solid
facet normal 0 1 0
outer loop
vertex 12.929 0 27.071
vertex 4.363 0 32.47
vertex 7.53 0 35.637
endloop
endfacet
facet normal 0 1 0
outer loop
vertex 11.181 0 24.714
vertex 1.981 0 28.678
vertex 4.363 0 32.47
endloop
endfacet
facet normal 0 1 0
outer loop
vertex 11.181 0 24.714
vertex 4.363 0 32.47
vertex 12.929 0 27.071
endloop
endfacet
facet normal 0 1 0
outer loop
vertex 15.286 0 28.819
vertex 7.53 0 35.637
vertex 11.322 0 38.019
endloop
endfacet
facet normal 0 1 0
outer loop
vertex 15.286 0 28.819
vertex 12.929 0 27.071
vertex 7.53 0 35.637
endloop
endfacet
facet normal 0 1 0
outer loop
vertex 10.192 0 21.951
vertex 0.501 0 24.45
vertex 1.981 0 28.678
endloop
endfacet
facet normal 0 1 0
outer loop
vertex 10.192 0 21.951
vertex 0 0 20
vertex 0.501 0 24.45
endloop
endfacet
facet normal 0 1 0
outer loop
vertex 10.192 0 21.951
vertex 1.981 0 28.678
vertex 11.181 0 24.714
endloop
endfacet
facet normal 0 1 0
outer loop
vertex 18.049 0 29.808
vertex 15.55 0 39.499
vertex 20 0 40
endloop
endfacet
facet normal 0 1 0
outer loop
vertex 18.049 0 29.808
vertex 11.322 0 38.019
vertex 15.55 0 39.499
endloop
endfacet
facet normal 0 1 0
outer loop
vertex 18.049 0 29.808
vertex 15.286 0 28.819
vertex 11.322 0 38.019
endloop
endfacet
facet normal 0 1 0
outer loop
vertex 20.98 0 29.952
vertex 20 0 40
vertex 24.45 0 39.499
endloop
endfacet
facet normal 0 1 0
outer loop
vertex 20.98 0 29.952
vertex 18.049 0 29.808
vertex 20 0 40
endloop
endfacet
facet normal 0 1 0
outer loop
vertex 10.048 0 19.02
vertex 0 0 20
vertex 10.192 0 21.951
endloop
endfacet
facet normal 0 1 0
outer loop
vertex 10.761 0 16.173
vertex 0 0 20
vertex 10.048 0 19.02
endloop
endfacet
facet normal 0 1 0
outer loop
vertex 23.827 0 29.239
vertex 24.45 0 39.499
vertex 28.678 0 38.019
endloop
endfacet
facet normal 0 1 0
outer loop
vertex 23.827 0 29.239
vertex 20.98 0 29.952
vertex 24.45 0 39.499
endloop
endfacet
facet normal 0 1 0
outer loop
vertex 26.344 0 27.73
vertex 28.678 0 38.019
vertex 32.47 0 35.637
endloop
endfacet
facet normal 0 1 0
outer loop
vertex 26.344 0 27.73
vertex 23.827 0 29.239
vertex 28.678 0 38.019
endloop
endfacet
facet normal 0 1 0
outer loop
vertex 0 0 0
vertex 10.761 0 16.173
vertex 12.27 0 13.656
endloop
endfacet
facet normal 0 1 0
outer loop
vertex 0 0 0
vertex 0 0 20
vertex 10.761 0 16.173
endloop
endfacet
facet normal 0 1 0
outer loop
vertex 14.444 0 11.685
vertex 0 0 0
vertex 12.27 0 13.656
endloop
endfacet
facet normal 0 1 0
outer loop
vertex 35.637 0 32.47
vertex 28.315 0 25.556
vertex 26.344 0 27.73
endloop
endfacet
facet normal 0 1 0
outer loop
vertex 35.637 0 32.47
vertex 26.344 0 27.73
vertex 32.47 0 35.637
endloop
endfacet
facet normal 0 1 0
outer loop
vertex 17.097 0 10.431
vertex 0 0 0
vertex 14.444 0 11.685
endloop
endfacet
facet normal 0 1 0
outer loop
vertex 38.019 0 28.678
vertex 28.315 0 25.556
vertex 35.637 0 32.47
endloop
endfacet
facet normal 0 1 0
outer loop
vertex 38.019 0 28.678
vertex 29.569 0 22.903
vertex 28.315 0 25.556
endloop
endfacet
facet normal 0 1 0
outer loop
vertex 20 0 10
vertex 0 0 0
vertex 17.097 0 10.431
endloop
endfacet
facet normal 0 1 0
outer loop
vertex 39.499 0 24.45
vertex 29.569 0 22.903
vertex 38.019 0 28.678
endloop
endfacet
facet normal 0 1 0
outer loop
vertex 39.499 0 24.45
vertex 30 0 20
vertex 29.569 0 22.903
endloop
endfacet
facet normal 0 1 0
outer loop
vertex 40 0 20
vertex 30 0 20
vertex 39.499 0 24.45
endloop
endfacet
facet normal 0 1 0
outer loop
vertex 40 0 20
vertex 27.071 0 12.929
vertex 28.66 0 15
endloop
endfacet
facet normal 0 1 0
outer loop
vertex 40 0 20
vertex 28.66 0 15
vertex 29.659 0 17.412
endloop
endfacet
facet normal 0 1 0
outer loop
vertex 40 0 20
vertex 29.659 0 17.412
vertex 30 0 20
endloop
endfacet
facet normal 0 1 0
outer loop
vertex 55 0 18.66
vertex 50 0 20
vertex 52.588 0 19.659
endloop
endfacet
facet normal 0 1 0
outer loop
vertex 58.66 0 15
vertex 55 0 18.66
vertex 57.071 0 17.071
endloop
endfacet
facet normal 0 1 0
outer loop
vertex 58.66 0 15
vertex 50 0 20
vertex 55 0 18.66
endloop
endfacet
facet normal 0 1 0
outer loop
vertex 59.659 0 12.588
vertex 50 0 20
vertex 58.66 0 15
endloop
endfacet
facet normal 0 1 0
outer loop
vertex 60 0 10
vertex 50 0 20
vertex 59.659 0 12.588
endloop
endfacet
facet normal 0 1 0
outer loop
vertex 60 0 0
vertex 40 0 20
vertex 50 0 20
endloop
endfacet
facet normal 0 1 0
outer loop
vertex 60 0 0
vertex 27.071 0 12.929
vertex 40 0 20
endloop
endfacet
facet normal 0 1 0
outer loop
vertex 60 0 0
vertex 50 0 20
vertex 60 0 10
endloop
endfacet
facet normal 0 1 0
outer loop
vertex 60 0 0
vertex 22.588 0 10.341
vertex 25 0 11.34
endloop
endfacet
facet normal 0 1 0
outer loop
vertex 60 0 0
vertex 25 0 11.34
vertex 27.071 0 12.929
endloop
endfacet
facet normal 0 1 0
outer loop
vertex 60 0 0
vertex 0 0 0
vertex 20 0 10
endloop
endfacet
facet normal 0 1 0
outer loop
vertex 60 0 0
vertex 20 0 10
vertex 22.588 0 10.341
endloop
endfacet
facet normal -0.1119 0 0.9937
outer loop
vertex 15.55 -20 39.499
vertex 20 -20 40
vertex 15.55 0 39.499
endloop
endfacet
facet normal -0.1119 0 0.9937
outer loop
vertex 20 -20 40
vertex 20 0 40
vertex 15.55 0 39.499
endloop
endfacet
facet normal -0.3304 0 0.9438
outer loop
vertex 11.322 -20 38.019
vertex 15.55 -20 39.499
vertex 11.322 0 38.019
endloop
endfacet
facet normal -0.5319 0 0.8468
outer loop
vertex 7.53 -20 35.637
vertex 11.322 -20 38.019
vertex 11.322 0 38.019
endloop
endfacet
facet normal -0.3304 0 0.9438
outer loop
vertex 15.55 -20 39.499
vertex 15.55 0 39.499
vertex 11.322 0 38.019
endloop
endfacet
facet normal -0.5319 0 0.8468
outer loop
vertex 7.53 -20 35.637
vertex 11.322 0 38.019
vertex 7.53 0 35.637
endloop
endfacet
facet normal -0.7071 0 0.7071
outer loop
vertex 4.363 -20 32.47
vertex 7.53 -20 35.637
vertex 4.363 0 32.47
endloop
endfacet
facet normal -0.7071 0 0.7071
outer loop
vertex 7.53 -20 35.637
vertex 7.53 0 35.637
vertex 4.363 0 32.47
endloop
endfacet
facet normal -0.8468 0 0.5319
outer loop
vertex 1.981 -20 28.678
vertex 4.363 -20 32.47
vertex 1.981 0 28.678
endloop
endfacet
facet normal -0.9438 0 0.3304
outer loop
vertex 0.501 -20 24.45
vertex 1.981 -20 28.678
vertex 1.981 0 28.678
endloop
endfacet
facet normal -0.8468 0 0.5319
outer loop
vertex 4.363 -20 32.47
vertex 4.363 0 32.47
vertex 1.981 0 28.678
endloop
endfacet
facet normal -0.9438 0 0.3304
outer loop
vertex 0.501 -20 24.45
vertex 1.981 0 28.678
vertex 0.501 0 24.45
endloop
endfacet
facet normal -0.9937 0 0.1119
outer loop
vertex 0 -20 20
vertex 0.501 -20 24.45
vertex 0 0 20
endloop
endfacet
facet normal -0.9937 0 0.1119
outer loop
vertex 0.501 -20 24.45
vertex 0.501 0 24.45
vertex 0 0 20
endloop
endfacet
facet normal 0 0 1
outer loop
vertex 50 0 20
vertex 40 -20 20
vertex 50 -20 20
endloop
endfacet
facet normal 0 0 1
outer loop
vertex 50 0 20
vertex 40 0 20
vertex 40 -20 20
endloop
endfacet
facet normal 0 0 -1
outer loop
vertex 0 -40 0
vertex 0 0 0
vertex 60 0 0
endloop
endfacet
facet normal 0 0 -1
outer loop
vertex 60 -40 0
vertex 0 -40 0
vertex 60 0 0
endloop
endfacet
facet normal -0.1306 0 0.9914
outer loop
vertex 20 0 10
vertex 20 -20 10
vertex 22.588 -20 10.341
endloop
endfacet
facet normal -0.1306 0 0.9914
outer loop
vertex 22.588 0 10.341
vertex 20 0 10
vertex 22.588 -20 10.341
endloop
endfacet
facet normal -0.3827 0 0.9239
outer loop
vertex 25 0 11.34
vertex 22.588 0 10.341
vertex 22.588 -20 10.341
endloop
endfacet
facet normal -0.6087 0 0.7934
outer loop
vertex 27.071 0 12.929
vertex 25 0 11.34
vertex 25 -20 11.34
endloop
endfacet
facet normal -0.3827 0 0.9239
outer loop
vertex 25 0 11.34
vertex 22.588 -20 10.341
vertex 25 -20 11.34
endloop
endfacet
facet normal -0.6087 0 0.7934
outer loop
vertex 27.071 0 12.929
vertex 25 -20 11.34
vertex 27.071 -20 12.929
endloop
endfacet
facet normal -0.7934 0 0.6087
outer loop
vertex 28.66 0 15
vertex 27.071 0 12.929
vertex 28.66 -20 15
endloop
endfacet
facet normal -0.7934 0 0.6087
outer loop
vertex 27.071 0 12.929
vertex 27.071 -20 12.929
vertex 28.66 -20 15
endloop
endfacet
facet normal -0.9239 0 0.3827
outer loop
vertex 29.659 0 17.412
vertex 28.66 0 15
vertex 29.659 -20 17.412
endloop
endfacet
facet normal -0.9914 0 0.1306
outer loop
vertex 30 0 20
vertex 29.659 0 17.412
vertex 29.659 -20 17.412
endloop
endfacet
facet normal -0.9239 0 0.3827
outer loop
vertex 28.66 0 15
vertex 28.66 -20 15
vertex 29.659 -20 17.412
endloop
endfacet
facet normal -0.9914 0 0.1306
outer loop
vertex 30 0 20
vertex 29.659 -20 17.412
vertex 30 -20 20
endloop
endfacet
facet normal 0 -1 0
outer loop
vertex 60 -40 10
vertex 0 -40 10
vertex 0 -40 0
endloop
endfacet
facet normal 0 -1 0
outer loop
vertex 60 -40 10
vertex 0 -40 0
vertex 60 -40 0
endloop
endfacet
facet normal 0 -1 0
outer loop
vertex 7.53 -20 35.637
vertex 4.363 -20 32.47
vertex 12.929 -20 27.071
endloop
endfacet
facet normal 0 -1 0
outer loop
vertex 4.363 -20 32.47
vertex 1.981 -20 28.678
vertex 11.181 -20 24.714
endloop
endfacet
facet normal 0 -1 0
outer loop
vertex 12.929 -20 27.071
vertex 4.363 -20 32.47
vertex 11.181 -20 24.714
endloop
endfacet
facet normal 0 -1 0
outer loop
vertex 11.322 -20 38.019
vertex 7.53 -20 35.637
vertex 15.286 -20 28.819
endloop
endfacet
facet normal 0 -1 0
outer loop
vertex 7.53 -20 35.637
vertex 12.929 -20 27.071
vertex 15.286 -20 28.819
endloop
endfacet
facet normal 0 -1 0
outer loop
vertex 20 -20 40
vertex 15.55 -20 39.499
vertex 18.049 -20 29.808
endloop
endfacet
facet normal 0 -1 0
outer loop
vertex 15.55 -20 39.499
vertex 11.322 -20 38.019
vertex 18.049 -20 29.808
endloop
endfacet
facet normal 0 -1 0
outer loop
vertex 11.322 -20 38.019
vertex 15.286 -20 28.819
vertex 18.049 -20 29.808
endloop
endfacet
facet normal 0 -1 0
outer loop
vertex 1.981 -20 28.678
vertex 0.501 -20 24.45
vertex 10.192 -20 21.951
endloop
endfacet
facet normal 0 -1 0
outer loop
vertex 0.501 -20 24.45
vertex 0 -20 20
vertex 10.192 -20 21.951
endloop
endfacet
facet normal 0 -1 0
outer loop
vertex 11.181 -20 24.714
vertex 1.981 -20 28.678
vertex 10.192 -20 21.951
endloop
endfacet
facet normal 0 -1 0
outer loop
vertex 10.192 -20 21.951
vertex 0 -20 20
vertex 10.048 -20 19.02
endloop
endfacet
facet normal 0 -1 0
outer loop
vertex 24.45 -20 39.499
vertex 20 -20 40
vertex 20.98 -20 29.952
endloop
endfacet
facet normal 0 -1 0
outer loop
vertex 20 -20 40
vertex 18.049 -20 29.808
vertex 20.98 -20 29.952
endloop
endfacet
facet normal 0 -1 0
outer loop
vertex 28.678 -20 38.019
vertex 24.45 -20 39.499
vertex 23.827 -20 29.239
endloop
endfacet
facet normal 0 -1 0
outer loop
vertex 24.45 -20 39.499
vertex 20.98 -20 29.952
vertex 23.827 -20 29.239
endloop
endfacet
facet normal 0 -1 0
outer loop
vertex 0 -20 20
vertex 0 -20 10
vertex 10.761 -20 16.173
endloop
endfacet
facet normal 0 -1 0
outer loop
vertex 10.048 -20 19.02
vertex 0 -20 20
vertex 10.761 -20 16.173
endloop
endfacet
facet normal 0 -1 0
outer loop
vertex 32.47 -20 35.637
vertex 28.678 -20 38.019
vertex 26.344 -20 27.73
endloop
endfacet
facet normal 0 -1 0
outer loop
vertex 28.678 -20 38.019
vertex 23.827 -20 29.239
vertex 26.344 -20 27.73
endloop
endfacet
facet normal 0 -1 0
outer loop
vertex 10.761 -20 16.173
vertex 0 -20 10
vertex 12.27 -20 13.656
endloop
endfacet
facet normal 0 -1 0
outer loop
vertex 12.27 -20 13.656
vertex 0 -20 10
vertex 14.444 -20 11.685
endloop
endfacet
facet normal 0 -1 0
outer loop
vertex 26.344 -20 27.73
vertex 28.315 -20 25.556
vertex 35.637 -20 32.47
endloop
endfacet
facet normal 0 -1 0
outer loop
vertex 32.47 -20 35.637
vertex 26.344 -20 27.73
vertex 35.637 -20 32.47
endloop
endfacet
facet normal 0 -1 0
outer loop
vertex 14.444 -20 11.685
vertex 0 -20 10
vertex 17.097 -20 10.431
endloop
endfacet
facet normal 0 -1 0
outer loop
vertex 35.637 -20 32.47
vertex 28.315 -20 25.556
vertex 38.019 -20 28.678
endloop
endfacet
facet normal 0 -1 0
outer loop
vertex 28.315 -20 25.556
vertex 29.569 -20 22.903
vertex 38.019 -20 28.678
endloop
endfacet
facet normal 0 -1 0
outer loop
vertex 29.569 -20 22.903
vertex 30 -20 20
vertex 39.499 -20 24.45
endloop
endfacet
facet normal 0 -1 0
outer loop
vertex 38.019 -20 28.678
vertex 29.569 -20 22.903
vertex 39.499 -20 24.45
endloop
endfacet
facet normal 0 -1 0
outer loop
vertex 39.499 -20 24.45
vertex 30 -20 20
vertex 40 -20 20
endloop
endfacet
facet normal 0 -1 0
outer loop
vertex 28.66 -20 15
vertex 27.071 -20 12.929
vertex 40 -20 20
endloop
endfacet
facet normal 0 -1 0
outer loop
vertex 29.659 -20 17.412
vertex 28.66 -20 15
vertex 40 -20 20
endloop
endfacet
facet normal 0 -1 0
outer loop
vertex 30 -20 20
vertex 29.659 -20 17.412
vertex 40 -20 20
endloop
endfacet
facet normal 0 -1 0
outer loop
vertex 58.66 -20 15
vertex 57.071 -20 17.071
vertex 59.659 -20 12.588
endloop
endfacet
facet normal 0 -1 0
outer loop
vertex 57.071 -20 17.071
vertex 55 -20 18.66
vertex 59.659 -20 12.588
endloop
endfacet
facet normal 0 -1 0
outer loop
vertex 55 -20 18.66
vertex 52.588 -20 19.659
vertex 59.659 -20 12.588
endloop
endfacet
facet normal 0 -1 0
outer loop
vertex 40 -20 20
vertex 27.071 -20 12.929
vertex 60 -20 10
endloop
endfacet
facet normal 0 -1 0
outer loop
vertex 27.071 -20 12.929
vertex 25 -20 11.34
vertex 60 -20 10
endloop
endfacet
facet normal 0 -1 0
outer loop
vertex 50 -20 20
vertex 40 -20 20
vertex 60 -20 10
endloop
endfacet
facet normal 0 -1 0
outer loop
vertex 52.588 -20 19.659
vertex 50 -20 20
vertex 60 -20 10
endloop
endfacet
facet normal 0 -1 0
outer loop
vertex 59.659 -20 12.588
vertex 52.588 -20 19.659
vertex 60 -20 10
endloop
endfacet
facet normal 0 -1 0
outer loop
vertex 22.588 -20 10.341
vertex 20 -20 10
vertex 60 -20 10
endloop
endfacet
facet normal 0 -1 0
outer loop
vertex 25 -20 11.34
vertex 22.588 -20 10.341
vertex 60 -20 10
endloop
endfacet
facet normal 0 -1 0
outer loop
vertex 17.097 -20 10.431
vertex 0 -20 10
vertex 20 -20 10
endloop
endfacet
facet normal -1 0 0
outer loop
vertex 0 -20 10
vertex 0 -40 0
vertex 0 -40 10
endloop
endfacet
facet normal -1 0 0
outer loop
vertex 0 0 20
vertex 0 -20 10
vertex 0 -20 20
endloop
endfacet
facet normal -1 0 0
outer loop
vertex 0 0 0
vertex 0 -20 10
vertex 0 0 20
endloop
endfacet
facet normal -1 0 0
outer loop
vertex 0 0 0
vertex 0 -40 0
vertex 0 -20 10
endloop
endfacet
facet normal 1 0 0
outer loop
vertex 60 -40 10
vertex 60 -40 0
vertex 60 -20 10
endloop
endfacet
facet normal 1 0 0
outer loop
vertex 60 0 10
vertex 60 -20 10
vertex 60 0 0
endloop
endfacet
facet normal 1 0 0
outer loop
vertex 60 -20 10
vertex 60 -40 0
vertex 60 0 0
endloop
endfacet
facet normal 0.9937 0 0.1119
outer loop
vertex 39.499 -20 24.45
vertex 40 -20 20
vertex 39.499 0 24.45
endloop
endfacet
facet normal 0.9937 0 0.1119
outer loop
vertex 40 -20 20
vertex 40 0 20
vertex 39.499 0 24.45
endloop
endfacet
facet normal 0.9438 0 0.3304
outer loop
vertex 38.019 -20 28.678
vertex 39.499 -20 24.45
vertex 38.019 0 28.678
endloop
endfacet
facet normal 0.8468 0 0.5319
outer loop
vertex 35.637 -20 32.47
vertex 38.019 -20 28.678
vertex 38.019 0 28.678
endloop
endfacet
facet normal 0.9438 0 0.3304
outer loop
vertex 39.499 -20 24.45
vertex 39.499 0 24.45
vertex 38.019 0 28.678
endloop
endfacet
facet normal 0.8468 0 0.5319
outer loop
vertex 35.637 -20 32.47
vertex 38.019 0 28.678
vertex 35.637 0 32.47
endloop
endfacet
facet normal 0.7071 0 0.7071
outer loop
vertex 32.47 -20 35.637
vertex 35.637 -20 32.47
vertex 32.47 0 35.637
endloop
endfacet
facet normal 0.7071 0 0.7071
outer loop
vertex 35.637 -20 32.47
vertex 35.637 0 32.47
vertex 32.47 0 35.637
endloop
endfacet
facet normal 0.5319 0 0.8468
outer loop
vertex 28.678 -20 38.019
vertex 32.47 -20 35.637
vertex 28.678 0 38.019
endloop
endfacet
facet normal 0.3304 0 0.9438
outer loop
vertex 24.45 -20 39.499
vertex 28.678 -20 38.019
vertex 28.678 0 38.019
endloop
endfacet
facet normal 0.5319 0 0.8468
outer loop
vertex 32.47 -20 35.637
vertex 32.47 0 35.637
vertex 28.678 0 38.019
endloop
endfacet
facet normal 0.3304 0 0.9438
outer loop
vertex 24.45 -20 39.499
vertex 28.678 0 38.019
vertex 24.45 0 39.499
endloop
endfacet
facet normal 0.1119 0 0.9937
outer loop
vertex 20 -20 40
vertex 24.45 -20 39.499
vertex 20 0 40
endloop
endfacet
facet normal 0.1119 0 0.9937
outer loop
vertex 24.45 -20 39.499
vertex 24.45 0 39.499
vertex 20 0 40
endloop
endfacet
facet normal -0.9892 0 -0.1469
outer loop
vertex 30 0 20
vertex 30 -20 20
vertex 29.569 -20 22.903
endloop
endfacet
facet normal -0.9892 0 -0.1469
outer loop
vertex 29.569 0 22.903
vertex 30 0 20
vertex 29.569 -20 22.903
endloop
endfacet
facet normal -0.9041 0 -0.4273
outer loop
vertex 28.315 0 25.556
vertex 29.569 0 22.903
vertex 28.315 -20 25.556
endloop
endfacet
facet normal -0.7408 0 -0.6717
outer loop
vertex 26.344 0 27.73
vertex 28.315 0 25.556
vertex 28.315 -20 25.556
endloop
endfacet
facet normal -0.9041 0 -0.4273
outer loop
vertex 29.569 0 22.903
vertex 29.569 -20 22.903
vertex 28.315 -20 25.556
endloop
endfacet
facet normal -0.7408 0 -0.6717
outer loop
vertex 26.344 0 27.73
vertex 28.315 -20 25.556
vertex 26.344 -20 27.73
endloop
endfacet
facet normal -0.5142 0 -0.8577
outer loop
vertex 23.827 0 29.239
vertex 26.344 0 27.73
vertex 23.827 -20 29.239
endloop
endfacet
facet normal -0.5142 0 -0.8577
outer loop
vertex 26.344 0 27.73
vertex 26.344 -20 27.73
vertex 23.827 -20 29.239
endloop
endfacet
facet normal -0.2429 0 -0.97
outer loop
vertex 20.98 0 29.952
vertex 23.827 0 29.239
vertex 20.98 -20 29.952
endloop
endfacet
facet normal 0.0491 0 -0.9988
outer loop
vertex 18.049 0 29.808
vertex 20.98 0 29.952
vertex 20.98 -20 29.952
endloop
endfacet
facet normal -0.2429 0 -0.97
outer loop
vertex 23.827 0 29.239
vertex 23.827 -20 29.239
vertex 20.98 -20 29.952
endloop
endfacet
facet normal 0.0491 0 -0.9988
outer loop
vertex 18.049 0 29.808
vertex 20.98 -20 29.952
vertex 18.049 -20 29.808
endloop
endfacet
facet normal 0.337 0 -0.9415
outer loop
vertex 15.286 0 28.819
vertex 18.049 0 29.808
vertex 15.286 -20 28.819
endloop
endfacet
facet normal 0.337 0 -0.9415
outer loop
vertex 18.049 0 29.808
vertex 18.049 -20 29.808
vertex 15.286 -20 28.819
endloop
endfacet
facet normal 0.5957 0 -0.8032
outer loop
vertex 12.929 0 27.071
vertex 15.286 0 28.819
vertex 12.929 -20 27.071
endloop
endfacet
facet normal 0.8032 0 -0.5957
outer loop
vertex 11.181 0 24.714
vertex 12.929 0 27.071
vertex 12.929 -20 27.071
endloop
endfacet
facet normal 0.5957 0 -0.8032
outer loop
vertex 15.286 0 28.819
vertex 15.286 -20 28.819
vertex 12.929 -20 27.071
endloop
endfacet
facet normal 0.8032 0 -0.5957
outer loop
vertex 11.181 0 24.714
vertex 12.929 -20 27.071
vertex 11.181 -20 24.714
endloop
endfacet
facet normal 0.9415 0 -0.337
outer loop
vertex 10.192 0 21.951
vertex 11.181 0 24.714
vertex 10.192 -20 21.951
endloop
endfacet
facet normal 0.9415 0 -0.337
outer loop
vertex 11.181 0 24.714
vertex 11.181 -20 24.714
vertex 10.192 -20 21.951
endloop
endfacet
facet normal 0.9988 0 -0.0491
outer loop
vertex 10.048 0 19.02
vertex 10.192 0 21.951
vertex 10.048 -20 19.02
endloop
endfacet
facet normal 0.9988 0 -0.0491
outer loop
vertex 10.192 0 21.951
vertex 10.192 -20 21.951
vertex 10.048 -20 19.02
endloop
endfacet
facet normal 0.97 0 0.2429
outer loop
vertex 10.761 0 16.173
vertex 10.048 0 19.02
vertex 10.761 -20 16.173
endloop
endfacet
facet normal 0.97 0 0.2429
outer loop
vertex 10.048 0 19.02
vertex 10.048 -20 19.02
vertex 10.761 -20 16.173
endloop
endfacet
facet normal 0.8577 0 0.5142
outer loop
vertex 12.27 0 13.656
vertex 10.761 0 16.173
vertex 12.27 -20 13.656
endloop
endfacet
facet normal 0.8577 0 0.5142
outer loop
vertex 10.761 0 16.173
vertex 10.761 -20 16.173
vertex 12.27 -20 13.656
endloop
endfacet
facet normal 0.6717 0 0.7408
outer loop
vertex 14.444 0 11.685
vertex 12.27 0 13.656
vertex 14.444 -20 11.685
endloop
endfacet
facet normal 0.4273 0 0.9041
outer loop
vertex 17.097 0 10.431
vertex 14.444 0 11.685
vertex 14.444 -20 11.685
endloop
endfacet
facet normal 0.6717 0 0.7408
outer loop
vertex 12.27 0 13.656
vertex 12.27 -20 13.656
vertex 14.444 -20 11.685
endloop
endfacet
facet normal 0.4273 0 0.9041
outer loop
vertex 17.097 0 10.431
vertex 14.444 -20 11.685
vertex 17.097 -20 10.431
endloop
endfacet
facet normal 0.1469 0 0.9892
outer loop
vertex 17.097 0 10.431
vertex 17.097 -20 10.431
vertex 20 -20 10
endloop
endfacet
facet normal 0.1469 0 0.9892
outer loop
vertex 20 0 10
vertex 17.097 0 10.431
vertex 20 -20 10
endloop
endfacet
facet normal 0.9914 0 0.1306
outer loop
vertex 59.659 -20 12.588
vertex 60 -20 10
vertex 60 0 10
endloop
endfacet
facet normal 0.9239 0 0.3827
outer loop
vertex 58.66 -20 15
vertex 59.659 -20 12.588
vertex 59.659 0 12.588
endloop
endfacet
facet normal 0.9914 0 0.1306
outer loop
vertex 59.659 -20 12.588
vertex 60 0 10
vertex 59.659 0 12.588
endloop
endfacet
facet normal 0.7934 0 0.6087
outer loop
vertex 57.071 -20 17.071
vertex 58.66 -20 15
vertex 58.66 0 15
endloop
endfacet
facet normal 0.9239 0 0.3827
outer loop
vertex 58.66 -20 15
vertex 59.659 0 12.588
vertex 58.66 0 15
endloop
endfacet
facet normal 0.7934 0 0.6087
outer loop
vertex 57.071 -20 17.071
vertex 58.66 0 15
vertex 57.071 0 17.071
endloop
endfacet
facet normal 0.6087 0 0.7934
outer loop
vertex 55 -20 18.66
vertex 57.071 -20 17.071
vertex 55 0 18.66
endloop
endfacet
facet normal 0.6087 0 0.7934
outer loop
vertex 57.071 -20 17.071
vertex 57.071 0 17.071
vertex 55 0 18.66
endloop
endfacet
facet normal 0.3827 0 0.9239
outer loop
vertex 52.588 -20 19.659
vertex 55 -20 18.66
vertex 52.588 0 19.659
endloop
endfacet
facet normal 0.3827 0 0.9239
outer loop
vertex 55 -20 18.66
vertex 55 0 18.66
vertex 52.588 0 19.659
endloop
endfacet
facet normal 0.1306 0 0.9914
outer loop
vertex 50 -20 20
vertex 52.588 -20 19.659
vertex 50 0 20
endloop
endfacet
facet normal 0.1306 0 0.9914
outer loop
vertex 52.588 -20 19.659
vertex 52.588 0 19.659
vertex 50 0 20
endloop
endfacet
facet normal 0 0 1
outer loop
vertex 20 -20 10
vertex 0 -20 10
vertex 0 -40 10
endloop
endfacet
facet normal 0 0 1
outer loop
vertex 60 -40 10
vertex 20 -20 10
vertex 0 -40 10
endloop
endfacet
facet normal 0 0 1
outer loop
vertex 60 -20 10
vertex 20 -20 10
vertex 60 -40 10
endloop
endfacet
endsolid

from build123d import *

# Parameters (mm, degrees)
F0_W     = 60
F0_H     = 10
F1_DEPTH = 40
F2_W     = 20
F2_H     = 20
F3_DEPTH = 10
F4_W     = 40
F4_H     = 20
F5_DEPTH = 30
F6_R     = 10
F7_R     = 19.99999
F9_DEPTH = 25


# Not quite as in the source:
# - a fillet or chamfer is up to 0.001 mm smaller than in the source, because OpenCascade refuses the exact size


with BuildPart() as f1:
    # F0 (on Front) → F1 (new body)
    with BuildSketch(Plane.XZ):
        with Locations((30, 5)):
            Rectangle(F0_W, F0_H)
    extrude(amount=F1_DEPTH)

    # F2 (on face) → F3 (join)
    with BuildSketch(Plane.XY.offset(10)):
        with Locations((50, -10)):
            Rectangle(F2_W, F2_H)
    extrude(amount=F3_DEPTH)

    # F4 (on face) → F5 (join)
    with BuildSketch(Plane.XY.offset(10)):
        with Locations((20, -10)):
            Rectangle(F4_W, F4_H)
    extrude(amount=F5_DEPTH)

    # F6
    f6_edges = [f1.edges().sort_by_distance(p)[0] for p in [
        (60, -10, 20),
    ]]
    fillet(f6_edges, radius=F6_R)

    # F7 (radius 20 in the source; OpenCascade refuses exactly that, so slightly less here)
    f7_edges = [f1.edges().sort_by_distance(p)[0] for p in [
        (40, -10, 40),
        (0, -10, 40),
    ]]
    fillet(f7_edges, radius=F7_R)

    # F8 (on face) → F9 (cut)
    with BuildSketch(Plane.XZ.offset(20)):
        with BuildLine():
            ThreePointArc((20, 10), (27.0710678119, 12.9289321881), (30, 20))
            ThreePointArc((30, 20), (12.9289321881, 27.0710678119), (20, 10))
        make_face()
    extrude(amount=-F9_DEPTH, mode=Mode.SUBTRACT)


solid = f1.part
